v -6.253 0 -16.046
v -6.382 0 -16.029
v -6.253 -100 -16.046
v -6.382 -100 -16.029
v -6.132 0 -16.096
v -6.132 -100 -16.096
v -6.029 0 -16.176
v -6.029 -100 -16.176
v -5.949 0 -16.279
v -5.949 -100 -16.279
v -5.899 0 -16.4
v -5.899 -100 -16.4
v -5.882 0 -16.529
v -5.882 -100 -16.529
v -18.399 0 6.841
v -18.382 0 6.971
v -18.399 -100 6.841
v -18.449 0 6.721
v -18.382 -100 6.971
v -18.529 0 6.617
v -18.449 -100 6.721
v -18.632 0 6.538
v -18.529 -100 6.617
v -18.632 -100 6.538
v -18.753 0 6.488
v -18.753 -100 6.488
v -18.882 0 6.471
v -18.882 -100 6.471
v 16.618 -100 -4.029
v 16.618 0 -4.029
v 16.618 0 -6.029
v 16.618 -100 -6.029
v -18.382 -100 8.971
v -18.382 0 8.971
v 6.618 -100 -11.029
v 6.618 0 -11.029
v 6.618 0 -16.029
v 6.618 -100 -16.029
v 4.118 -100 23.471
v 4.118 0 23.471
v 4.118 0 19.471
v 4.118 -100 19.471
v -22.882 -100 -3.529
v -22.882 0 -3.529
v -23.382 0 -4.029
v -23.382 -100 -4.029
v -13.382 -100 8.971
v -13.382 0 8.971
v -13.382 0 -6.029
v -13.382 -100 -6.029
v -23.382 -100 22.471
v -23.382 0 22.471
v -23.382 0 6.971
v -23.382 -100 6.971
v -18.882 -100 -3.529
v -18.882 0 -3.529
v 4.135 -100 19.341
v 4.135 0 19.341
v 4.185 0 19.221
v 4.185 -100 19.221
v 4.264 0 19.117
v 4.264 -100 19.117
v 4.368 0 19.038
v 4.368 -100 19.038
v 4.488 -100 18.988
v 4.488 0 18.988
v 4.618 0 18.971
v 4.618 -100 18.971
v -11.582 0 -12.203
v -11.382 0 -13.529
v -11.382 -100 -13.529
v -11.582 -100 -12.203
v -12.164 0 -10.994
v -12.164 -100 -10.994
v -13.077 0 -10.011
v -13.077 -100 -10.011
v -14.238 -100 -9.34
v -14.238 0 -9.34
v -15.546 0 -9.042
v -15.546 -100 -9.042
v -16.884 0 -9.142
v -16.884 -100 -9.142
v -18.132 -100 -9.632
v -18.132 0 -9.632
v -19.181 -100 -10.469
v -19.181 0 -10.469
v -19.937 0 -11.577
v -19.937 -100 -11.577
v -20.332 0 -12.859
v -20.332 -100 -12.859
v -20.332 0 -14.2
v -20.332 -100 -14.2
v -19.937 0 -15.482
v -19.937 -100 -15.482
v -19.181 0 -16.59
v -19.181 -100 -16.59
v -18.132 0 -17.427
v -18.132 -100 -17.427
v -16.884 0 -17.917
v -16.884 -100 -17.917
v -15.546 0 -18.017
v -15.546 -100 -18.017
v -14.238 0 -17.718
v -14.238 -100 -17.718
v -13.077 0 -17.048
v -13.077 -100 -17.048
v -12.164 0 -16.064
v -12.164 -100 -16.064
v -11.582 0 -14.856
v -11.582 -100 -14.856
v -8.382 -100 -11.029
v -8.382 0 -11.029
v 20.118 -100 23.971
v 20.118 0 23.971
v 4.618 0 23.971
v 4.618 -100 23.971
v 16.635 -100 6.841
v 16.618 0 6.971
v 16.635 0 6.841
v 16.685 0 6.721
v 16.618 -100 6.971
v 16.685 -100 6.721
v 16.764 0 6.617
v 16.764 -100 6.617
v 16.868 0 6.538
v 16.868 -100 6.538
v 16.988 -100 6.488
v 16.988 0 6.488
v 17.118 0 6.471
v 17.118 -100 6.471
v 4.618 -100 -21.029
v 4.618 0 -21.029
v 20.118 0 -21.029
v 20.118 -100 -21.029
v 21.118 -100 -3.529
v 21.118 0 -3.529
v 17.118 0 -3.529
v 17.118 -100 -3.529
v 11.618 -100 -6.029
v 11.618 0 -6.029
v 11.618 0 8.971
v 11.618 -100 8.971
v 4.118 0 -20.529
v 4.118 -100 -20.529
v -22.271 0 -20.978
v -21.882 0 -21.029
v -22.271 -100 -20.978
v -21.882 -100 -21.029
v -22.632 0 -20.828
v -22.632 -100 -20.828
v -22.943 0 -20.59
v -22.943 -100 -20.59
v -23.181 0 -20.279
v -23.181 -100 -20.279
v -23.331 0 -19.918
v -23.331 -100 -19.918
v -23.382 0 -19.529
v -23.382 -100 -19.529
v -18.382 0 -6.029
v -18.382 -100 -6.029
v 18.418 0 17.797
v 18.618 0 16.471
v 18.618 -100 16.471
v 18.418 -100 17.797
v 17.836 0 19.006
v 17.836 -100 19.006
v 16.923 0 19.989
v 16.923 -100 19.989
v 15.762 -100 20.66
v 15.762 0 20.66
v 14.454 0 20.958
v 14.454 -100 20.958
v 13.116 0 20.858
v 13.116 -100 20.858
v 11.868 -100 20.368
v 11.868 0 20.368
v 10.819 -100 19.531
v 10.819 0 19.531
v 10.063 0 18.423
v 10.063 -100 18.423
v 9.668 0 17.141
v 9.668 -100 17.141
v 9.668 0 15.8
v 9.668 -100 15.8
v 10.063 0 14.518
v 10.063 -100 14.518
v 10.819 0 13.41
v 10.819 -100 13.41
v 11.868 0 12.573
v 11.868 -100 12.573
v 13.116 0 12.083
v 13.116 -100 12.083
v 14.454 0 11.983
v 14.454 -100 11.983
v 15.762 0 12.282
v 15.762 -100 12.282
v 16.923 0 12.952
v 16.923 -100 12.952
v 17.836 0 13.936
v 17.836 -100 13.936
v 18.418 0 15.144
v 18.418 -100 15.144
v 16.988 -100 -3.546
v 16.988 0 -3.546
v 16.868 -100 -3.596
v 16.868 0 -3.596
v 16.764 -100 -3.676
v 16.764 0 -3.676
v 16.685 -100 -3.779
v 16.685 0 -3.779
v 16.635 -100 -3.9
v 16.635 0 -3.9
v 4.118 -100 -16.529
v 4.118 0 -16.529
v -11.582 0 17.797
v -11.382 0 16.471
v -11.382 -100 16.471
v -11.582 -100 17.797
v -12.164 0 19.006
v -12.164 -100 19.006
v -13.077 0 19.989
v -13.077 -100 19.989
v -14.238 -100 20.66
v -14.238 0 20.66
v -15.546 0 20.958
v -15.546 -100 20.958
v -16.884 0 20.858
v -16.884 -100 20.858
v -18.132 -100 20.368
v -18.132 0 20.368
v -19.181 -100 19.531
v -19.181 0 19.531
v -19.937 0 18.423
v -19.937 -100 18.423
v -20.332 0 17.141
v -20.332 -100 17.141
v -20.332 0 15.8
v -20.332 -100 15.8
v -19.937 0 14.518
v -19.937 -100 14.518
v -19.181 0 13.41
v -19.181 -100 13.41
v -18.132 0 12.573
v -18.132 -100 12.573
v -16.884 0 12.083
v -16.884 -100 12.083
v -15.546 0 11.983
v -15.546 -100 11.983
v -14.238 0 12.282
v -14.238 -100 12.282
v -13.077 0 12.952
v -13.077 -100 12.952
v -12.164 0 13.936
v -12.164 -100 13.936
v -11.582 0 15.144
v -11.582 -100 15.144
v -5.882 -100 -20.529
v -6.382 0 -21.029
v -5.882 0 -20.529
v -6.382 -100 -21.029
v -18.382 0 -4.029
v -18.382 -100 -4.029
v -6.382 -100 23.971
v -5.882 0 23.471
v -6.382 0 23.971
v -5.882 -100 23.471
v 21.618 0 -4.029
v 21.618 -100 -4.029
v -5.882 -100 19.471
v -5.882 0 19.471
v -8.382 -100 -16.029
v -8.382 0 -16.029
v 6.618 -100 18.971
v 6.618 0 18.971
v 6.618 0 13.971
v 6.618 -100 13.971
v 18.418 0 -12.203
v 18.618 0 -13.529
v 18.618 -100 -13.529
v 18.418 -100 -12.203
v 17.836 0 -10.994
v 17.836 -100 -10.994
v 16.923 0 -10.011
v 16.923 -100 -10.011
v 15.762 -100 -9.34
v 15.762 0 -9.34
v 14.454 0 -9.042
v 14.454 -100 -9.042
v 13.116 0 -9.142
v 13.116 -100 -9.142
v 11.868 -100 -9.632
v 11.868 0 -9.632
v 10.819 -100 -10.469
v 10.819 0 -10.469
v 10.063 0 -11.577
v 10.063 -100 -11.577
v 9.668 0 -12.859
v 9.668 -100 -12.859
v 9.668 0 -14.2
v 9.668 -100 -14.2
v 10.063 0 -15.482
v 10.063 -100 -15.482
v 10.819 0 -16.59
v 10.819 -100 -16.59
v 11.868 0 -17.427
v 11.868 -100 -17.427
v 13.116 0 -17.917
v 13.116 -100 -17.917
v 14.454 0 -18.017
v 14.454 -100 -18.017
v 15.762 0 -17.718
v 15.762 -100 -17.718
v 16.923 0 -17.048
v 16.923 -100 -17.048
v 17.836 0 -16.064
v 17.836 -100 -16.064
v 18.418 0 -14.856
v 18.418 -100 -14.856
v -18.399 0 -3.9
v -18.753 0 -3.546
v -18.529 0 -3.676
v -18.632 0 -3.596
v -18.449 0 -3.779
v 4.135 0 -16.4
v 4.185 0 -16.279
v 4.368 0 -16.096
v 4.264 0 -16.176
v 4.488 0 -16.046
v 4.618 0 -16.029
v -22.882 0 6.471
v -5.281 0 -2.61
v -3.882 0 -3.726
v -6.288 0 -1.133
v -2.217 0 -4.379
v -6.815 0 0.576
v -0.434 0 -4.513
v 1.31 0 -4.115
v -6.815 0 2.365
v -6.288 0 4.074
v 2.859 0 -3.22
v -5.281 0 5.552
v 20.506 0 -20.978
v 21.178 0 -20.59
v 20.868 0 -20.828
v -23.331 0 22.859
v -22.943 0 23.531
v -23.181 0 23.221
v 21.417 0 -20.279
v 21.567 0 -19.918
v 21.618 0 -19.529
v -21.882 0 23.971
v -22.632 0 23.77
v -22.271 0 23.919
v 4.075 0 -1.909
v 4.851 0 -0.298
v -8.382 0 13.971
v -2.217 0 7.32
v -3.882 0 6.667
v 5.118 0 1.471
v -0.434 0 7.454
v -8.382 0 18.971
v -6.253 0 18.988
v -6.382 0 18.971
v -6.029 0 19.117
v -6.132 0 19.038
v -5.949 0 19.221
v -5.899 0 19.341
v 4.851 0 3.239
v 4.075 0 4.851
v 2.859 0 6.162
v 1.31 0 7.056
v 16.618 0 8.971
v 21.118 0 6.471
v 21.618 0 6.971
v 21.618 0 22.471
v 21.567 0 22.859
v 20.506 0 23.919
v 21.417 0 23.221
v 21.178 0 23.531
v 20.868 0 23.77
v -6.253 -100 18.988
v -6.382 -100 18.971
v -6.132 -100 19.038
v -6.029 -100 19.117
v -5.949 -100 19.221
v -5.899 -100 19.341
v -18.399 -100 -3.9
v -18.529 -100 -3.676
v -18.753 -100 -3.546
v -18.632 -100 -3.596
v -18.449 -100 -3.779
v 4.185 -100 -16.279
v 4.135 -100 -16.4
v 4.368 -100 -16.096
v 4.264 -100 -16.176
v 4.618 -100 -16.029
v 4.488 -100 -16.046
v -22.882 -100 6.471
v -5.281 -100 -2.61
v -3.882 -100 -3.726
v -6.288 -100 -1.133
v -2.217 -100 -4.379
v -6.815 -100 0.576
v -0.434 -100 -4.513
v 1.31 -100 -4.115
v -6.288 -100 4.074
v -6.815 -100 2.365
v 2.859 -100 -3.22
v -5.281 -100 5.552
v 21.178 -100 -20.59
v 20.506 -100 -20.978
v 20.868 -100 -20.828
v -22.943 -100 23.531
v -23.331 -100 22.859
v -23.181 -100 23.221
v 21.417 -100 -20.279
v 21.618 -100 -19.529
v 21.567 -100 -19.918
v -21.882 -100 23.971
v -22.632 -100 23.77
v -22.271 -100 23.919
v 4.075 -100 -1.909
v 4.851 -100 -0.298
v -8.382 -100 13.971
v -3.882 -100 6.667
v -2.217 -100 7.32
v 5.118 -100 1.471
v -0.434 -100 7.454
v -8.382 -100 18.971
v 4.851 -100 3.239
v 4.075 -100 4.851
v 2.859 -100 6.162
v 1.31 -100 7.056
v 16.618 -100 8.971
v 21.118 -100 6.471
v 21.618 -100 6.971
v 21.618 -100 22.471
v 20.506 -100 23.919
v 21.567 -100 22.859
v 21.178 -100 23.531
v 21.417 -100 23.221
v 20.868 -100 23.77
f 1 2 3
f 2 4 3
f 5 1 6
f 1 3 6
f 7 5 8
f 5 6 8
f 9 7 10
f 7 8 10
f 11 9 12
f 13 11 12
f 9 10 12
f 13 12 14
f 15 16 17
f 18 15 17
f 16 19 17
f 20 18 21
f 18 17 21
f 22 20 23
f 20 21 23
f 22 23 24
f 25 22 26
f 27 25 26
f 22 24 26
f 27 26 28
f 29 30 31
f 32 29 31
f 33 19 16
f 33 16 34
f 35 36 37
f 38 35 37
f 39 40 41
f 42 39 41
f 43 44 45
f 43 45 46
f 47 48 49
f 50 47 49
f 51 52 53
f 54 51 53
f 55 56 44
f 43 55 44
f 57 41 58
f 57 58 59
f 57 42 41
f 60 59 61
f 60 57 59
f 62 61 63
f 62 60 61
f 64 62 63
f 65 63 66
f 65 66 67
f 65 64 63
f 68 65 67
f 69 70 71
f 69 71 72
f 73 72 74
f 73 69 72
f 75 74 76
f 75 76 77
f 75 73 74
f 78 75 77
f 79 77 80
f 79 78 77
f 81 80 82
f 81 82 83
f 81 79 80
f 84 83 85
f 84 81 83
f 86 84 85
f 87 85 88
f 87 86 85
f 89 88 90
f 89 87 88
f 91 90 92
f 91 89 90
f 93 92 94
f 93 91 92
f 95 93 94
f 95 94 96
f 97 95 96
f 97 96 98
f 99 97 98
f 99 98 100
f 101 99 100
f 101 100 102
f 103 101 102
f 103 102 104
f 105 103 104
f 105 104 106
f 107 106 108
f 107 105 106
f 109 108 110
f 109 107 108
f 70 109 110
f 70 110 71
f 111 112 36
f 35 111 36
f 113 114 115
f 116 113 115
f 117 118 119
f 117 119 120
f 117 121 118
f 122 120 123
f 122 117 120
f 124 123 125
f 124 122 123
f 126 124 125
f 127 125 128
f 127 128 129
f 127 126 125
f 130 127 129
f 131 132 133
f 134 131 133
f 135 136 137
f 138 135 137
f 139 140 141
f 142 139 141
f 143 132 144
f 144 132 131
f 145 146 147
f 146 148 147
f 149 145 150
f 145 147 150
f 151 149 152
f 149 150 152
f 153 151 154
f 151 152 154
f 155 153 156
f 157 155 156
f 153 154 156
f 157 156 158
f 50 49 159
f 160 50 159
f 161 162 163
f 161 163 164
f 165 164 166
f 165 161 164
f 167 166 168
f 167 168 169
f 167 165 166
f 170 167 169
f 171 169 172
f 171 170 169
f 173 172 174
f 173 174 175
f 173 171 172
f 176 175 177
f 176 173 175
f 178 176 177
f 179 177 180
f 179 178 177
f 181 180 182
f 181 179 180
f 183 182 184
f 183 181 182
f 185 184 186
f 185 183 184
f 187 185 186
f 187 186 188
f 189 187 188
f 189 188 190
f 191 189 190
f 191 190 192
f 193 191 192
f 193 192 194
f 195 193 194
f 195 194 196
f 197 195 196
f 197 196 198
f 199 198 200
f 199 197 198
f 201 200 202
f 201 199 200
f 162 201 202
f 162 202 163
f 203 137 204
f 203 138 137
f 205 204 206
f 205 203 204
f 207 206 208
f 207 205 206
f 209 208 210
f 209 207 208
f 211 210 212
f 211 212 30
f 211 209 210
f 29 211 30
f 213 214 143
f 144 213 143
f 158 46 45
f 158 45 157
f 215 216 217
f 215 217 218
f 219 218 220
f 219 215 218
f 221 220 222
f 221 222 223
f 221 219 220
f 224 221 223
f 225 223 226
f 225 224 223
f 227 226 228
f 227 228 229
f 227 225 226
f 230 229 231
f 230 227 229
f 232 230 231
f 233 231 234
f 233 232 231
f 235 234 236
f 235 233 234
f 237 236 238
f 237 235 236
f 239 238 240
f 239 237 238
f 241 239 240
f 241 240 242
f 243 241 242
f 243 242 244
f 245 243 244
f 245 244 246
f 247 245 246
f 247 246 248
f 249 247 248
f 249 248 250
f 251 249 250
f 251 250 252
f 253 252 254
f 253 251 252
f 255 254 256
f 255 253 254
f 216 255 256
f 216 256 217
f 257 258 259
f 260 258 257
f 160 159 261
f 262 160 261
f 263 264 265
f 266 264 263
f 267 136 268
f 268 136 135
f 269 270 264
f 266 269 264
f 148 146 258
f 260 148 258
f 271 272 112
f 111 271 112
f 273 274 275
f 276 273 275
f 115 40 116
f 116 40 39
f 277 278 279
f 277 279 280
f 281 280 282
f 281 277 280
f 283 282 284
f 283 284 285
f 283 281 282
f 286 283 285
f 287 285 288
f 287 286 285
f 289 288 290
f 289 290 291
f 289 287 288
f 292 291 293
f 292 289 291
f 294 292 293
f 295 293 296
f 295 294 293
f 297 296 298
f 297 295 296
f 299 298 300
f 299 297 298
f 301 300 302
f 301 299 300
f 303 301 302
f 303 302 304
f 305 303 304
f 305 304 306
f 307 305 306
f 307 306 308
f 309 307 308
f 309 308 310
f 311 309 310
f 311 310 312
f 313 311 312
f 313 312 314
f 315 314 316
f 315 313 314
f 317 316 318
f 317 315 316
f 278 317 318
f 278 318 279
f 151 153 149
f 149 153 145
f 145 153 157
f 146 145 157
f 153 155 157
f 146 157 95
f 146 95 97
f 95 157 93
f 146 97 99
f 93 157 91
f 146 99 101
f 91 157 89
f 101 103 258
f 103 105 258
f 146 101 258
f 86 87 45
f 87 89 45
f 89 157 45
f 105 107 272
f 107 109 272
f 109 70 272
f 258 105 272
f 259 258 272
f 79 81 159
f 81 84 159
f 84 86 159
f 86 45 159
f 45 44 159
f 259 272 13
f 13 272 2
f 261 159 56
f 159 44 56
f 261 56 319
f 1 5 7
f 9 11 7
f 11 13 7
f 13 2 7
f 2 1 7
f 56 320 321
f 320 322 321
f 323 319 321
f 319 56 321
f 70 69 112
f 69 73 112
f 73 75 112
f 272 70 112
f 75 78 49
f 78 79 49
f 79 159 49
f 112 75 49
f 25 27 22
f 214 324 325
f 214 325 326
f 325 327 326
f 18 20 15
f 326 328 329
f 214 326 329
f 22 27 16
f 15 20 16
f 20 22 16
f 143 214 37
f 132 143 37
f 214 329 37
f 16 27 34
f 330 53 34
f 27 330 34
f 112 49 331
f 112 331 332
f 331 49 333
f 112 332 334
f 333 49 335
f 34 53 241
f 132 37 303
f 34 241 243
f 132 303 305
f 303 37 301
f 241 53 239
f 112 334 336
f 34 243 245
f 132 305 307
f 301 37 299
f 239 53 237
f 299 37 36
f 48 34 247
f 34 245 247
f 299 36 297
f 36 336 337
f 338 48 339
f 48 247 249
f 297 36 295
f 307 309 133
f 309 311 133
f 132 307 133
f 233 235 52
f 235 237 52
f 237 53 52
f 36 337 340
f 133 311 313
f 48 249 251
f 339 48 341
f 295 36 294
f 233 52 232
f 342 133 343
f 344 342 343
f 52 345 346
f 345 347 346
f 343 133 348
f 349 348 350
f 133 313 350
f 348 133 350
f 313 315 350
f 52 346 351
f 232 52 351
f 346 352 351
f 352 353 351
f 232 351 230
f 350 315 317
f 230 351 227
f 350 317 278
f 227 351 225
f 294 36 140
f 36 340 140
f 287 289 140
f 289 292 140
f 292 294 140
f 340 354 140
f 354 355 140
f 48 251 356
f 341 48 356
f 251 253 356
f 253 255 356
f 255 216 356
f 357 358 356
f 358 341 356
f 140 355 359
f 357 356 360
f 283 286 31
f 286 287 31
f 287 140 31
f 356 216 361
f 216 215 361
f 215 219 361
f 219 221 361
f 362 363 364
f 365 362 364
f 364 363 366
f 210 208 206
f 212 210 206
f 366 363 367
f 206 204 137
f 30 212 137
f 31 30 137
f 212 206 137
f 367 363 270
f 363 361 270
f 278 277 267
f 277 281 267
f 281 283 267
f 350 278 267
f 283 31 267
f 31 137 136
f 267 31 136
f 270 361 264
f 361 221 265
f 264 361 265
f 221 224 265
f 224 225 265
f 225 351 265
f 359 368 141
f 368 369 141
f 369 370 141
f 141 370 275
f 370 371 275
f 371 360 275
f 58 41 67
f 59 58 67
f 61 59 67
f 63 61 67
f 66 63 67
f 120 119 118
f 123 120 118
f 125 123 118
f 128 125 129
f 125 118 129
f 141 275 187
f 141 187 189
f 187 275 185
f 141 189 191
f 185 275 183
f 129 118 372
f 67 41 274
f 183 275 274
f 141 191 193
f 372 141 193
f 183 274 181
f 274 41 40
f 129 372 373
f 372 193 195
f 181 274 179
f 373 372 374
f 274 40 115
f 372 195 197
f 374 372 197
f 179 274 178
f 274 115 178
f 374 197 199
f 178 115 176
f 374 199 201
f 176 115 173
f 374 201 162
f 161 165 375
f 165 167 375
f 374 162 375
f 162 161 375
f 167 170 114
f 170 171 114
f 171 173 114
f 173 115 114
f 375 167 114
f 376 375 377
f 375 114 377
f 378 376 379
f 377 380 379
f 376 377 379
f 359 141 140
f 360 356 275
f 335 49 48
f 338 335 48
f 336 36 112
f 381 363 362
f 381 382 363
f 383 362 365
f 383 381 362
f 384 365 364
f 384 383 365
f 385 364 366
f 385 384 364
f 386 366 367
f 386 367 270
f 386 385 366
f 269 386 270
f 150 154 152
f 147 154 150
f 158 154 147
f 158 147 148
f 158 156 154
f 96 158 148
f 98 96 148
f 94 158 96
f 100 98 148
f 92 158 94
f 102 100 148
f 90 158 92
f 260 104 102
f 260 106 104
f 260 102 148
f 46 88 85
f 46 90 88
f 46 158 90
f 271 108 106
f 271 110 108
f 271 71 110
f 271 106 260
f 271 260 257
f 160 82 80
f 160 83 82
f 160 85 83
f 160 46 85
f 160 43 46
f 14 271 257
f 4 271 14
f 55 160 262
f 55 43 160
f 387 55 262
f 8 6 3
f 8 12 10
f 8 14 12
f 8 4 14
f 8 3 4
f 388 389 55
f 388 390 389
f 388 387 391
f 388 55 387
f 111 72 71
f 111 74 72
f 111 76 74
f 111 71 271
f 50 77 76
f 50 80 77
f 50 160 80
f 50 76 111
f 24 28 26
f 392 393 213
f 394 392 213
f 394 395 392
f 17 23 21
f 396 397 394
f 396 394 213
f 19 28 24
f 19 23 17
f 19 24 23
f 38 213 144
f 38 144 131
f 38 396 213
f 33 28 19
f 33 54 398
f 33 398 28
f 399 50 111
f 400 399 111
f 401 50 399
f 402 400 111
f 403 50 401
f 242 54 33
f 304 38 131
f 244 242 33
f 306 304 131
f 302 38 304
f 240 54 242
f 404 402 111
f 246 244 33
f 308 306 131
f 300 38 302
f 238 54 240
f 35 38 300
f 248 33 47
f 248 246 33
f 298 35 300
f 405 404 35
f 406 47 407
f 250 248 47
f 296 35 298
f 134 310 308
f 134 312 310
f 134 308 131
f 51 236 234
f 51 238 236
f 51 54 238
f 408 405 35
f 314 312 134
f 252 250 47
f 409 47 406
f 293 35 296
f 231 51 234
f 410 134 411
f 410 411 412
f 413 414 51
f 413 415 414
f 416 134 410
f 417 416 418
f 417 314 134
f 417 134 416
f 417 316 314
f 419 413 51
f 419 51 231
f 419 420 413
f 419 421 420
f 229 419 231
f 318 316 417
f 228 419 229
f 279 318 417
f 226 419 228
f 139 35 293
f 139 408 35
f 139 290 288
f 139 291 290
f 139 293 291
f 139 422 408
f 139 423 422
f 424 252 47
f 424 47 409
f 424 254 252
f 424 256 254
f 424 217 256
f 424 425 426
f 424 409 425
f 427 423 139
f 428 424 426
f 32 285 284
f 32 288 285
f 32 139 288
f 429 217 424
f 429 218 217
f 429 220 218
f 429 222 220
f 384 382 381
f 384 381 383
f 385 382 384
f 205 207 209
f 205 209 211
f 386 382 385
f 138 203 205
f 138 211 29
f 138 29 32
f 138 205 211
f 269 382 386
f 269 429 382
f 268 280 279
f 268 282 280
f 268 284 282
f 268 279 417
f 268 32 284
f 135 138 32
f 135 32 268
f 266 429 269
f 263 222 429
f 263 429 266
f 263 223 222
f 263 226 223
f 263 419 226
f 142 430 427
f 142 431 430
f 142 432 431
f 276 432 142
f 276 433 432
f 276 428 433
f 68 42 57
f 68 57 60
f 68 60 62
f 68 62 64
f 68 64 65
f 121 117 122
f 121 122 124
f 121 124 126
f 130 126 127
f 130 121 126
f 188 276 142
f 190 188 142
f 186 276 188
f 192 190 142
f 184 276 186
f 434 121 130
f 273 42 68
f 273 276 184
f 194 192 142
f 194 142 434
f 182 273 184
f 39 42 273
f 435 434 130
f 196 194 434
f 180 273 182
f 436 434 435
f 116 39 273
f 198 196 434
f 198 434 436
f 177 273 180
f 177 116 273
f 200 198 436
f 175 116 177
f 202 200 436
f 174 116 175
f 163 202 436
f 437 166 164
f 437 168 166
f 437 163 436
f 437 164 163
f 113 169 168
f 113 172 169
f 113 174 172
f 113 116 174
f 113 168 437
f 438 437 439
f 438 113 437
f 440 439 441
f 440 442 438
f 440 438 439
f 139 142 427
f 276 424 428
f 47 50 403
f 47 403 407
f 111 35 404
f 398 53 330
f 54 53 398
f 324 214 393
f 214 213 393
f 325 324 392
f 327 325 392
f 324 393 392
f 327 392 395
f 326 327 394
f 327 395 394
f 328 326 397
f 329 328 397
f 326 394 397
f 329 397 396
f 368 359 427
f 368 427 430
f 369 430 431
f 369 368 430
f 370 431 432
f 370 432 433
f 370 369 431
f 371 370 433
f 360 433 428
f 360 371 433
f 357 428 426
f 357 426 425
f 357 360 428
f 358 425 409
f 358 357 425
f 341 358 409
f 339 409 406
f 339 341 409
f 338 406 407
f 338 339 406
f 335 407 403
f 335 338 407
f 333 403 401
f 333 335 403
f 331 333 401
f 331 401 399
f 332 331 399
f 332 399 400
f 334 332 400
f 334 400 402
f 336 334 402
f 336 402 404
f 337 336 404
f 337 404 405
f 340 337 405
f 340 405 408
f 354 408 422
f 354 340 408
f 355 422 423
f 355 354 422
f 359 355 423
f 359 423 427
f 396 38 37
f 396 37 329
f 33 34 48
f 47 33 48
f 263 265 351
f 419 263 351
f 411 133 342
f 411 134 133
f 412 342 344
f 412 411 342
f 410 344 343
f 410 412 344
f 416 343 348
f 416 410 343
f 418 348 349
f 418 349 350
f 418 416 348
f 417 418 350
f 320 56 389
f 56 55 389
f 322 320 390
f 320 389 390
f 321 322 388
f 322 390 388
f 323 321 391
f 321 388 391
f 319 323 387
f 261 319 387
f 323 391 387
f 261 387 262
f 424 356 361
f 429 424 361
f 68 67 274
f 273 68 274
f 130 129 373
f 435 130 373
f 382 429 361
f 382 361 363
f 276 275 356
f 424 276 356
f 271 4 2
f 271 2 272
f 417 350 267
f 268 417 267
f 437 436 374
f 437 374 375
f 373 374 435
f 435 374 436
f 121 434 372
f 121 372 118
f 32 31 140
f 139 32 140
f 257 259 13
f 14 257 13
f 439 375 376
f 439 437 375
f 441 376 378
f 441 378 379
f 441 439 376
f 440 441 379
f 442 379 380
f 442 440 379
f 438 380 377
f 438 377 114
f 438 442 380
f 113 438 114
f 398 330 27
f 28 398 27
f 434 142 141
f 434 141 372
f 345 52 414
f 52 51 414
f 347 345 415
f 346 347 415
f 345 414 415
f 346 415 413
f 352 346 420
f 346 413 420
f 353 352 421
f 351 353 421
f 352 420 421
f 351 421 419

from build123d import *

# Parameters (mm, degrees)
F0_R     = 4.5
F0_R_2   = 6
F1_DEPTH = 100
F2_R     = 1.5
F3_R     = 0.5
F4_SIZE  = 0.5


with BuildPart() as f1:
    # F0 (on Front) → F1 (new body)
    with BuildSketch(Plane.XZ):
        Polygon((4.117647, -21.029412), (21.617647, -21.029412), (21.617647, -3.529412), (16.617647, -3.529412), (16.617647, -6.029412), (11.617647, -6.029412), (11.617647, 8.970588), (16.617647, 8.970588), (16.617647, 6.470588), (21.617647, 6.470588), (21.617647, 23.970588), (4.117647, 23.970588), (4.117647, 18.970588), (6.617647, 18.970588), (6.617647, 13.970588), (-8.382353, 13.970588), (-8.382353, 18.970588), (-5.882353, 18.970588), (-5.882353, 23.970588), (-23.382353, 23.970588), (-23.382353, 6.470588), (-18.382353, 6.470588), (-18.382353, 8.970588), (-13.382353, 8.970588), (-13.382353, -6.029412), (-18.382353, -6.029412), (-18.382353, -3.529412), (-23.382353, -3.529412), (-23.382353, -21.029412), (-5.882353, -21.029412), (-5.882353, -16.029412), (-8.382353, -16.029412), (-8.382353, -11.029412), (6.617647, -11.029412), (6.617647, -16.029412), (4.117647, -16.029412), align=None)
        with Locations((-15.882353, -13.529412)):
            Circle(F0_R, mode=Mode.SUBTRACT)
        with Locations((14.117647, -13.529412)):
            Circle(F0_R, mode=Mode.SUBTRACT)
        with Locations((-0.882353, 1.470588)):
            Circle(F0_R_2, mode=Mode.SUBTRACT)
        with Locations((-15.882353, 16.470588)):
            Circle(F0_R, mode=Mode.SUBTRACT)
        with Locations((14.117647, 16.470588)):
            Circle(F0_R, mode=Mode.SUBTRACT)
    extrude(amount=F1_DEPTH)

    # F2
    f2_edges = [f1.edges().sort_by_distance(p)[0] for p in [
        (21.617647, -50, 23.970588),
        (21.617647, -50, -21.029412),
        (-23.382353, -50, 23.970588),
        (-23.382353, -50, -21.029412),
    ]]
    fillet(f2_edges, radius=F2_R)

    # F3
    f3_edges = [f1.edges().sort_by_distance(p)[0] for p in [
        (-18.382353, -50, 6.470588),
        (-5.882353, -50, 18.970588),
        (4.117647, -50, 18.970588),
        (16.617647, -50, 6.470588),
        (4.117647, -50, -16.029412),
        (16.617647, -50, -3.529412),
        (-5.882353, -50, -16.029412),
        (-18.382353, -50, -3.529412),
    ]]
    fillet(f3_edges, radius=F3_R)

    # F4
    f4_edges = [f1.edges().sort_by_distance(p)[0] for p in [
        (-5.882353, -50, 23.970588),
        (4.117647, -50, 23.970588),
        (21.617647, -50, 6.470588),
        (21.617647, -50, -3.529412),
        (-5.882353, -50, -21.029412),
        (-23.382353, -50, -3.529412),
        (-23.382353, -50, 6.470588),
        (4.117647, -50, -21.029412),
    ]]
    chamfer(f4_edges, length=F4_SIZE)


solid = f1.part
